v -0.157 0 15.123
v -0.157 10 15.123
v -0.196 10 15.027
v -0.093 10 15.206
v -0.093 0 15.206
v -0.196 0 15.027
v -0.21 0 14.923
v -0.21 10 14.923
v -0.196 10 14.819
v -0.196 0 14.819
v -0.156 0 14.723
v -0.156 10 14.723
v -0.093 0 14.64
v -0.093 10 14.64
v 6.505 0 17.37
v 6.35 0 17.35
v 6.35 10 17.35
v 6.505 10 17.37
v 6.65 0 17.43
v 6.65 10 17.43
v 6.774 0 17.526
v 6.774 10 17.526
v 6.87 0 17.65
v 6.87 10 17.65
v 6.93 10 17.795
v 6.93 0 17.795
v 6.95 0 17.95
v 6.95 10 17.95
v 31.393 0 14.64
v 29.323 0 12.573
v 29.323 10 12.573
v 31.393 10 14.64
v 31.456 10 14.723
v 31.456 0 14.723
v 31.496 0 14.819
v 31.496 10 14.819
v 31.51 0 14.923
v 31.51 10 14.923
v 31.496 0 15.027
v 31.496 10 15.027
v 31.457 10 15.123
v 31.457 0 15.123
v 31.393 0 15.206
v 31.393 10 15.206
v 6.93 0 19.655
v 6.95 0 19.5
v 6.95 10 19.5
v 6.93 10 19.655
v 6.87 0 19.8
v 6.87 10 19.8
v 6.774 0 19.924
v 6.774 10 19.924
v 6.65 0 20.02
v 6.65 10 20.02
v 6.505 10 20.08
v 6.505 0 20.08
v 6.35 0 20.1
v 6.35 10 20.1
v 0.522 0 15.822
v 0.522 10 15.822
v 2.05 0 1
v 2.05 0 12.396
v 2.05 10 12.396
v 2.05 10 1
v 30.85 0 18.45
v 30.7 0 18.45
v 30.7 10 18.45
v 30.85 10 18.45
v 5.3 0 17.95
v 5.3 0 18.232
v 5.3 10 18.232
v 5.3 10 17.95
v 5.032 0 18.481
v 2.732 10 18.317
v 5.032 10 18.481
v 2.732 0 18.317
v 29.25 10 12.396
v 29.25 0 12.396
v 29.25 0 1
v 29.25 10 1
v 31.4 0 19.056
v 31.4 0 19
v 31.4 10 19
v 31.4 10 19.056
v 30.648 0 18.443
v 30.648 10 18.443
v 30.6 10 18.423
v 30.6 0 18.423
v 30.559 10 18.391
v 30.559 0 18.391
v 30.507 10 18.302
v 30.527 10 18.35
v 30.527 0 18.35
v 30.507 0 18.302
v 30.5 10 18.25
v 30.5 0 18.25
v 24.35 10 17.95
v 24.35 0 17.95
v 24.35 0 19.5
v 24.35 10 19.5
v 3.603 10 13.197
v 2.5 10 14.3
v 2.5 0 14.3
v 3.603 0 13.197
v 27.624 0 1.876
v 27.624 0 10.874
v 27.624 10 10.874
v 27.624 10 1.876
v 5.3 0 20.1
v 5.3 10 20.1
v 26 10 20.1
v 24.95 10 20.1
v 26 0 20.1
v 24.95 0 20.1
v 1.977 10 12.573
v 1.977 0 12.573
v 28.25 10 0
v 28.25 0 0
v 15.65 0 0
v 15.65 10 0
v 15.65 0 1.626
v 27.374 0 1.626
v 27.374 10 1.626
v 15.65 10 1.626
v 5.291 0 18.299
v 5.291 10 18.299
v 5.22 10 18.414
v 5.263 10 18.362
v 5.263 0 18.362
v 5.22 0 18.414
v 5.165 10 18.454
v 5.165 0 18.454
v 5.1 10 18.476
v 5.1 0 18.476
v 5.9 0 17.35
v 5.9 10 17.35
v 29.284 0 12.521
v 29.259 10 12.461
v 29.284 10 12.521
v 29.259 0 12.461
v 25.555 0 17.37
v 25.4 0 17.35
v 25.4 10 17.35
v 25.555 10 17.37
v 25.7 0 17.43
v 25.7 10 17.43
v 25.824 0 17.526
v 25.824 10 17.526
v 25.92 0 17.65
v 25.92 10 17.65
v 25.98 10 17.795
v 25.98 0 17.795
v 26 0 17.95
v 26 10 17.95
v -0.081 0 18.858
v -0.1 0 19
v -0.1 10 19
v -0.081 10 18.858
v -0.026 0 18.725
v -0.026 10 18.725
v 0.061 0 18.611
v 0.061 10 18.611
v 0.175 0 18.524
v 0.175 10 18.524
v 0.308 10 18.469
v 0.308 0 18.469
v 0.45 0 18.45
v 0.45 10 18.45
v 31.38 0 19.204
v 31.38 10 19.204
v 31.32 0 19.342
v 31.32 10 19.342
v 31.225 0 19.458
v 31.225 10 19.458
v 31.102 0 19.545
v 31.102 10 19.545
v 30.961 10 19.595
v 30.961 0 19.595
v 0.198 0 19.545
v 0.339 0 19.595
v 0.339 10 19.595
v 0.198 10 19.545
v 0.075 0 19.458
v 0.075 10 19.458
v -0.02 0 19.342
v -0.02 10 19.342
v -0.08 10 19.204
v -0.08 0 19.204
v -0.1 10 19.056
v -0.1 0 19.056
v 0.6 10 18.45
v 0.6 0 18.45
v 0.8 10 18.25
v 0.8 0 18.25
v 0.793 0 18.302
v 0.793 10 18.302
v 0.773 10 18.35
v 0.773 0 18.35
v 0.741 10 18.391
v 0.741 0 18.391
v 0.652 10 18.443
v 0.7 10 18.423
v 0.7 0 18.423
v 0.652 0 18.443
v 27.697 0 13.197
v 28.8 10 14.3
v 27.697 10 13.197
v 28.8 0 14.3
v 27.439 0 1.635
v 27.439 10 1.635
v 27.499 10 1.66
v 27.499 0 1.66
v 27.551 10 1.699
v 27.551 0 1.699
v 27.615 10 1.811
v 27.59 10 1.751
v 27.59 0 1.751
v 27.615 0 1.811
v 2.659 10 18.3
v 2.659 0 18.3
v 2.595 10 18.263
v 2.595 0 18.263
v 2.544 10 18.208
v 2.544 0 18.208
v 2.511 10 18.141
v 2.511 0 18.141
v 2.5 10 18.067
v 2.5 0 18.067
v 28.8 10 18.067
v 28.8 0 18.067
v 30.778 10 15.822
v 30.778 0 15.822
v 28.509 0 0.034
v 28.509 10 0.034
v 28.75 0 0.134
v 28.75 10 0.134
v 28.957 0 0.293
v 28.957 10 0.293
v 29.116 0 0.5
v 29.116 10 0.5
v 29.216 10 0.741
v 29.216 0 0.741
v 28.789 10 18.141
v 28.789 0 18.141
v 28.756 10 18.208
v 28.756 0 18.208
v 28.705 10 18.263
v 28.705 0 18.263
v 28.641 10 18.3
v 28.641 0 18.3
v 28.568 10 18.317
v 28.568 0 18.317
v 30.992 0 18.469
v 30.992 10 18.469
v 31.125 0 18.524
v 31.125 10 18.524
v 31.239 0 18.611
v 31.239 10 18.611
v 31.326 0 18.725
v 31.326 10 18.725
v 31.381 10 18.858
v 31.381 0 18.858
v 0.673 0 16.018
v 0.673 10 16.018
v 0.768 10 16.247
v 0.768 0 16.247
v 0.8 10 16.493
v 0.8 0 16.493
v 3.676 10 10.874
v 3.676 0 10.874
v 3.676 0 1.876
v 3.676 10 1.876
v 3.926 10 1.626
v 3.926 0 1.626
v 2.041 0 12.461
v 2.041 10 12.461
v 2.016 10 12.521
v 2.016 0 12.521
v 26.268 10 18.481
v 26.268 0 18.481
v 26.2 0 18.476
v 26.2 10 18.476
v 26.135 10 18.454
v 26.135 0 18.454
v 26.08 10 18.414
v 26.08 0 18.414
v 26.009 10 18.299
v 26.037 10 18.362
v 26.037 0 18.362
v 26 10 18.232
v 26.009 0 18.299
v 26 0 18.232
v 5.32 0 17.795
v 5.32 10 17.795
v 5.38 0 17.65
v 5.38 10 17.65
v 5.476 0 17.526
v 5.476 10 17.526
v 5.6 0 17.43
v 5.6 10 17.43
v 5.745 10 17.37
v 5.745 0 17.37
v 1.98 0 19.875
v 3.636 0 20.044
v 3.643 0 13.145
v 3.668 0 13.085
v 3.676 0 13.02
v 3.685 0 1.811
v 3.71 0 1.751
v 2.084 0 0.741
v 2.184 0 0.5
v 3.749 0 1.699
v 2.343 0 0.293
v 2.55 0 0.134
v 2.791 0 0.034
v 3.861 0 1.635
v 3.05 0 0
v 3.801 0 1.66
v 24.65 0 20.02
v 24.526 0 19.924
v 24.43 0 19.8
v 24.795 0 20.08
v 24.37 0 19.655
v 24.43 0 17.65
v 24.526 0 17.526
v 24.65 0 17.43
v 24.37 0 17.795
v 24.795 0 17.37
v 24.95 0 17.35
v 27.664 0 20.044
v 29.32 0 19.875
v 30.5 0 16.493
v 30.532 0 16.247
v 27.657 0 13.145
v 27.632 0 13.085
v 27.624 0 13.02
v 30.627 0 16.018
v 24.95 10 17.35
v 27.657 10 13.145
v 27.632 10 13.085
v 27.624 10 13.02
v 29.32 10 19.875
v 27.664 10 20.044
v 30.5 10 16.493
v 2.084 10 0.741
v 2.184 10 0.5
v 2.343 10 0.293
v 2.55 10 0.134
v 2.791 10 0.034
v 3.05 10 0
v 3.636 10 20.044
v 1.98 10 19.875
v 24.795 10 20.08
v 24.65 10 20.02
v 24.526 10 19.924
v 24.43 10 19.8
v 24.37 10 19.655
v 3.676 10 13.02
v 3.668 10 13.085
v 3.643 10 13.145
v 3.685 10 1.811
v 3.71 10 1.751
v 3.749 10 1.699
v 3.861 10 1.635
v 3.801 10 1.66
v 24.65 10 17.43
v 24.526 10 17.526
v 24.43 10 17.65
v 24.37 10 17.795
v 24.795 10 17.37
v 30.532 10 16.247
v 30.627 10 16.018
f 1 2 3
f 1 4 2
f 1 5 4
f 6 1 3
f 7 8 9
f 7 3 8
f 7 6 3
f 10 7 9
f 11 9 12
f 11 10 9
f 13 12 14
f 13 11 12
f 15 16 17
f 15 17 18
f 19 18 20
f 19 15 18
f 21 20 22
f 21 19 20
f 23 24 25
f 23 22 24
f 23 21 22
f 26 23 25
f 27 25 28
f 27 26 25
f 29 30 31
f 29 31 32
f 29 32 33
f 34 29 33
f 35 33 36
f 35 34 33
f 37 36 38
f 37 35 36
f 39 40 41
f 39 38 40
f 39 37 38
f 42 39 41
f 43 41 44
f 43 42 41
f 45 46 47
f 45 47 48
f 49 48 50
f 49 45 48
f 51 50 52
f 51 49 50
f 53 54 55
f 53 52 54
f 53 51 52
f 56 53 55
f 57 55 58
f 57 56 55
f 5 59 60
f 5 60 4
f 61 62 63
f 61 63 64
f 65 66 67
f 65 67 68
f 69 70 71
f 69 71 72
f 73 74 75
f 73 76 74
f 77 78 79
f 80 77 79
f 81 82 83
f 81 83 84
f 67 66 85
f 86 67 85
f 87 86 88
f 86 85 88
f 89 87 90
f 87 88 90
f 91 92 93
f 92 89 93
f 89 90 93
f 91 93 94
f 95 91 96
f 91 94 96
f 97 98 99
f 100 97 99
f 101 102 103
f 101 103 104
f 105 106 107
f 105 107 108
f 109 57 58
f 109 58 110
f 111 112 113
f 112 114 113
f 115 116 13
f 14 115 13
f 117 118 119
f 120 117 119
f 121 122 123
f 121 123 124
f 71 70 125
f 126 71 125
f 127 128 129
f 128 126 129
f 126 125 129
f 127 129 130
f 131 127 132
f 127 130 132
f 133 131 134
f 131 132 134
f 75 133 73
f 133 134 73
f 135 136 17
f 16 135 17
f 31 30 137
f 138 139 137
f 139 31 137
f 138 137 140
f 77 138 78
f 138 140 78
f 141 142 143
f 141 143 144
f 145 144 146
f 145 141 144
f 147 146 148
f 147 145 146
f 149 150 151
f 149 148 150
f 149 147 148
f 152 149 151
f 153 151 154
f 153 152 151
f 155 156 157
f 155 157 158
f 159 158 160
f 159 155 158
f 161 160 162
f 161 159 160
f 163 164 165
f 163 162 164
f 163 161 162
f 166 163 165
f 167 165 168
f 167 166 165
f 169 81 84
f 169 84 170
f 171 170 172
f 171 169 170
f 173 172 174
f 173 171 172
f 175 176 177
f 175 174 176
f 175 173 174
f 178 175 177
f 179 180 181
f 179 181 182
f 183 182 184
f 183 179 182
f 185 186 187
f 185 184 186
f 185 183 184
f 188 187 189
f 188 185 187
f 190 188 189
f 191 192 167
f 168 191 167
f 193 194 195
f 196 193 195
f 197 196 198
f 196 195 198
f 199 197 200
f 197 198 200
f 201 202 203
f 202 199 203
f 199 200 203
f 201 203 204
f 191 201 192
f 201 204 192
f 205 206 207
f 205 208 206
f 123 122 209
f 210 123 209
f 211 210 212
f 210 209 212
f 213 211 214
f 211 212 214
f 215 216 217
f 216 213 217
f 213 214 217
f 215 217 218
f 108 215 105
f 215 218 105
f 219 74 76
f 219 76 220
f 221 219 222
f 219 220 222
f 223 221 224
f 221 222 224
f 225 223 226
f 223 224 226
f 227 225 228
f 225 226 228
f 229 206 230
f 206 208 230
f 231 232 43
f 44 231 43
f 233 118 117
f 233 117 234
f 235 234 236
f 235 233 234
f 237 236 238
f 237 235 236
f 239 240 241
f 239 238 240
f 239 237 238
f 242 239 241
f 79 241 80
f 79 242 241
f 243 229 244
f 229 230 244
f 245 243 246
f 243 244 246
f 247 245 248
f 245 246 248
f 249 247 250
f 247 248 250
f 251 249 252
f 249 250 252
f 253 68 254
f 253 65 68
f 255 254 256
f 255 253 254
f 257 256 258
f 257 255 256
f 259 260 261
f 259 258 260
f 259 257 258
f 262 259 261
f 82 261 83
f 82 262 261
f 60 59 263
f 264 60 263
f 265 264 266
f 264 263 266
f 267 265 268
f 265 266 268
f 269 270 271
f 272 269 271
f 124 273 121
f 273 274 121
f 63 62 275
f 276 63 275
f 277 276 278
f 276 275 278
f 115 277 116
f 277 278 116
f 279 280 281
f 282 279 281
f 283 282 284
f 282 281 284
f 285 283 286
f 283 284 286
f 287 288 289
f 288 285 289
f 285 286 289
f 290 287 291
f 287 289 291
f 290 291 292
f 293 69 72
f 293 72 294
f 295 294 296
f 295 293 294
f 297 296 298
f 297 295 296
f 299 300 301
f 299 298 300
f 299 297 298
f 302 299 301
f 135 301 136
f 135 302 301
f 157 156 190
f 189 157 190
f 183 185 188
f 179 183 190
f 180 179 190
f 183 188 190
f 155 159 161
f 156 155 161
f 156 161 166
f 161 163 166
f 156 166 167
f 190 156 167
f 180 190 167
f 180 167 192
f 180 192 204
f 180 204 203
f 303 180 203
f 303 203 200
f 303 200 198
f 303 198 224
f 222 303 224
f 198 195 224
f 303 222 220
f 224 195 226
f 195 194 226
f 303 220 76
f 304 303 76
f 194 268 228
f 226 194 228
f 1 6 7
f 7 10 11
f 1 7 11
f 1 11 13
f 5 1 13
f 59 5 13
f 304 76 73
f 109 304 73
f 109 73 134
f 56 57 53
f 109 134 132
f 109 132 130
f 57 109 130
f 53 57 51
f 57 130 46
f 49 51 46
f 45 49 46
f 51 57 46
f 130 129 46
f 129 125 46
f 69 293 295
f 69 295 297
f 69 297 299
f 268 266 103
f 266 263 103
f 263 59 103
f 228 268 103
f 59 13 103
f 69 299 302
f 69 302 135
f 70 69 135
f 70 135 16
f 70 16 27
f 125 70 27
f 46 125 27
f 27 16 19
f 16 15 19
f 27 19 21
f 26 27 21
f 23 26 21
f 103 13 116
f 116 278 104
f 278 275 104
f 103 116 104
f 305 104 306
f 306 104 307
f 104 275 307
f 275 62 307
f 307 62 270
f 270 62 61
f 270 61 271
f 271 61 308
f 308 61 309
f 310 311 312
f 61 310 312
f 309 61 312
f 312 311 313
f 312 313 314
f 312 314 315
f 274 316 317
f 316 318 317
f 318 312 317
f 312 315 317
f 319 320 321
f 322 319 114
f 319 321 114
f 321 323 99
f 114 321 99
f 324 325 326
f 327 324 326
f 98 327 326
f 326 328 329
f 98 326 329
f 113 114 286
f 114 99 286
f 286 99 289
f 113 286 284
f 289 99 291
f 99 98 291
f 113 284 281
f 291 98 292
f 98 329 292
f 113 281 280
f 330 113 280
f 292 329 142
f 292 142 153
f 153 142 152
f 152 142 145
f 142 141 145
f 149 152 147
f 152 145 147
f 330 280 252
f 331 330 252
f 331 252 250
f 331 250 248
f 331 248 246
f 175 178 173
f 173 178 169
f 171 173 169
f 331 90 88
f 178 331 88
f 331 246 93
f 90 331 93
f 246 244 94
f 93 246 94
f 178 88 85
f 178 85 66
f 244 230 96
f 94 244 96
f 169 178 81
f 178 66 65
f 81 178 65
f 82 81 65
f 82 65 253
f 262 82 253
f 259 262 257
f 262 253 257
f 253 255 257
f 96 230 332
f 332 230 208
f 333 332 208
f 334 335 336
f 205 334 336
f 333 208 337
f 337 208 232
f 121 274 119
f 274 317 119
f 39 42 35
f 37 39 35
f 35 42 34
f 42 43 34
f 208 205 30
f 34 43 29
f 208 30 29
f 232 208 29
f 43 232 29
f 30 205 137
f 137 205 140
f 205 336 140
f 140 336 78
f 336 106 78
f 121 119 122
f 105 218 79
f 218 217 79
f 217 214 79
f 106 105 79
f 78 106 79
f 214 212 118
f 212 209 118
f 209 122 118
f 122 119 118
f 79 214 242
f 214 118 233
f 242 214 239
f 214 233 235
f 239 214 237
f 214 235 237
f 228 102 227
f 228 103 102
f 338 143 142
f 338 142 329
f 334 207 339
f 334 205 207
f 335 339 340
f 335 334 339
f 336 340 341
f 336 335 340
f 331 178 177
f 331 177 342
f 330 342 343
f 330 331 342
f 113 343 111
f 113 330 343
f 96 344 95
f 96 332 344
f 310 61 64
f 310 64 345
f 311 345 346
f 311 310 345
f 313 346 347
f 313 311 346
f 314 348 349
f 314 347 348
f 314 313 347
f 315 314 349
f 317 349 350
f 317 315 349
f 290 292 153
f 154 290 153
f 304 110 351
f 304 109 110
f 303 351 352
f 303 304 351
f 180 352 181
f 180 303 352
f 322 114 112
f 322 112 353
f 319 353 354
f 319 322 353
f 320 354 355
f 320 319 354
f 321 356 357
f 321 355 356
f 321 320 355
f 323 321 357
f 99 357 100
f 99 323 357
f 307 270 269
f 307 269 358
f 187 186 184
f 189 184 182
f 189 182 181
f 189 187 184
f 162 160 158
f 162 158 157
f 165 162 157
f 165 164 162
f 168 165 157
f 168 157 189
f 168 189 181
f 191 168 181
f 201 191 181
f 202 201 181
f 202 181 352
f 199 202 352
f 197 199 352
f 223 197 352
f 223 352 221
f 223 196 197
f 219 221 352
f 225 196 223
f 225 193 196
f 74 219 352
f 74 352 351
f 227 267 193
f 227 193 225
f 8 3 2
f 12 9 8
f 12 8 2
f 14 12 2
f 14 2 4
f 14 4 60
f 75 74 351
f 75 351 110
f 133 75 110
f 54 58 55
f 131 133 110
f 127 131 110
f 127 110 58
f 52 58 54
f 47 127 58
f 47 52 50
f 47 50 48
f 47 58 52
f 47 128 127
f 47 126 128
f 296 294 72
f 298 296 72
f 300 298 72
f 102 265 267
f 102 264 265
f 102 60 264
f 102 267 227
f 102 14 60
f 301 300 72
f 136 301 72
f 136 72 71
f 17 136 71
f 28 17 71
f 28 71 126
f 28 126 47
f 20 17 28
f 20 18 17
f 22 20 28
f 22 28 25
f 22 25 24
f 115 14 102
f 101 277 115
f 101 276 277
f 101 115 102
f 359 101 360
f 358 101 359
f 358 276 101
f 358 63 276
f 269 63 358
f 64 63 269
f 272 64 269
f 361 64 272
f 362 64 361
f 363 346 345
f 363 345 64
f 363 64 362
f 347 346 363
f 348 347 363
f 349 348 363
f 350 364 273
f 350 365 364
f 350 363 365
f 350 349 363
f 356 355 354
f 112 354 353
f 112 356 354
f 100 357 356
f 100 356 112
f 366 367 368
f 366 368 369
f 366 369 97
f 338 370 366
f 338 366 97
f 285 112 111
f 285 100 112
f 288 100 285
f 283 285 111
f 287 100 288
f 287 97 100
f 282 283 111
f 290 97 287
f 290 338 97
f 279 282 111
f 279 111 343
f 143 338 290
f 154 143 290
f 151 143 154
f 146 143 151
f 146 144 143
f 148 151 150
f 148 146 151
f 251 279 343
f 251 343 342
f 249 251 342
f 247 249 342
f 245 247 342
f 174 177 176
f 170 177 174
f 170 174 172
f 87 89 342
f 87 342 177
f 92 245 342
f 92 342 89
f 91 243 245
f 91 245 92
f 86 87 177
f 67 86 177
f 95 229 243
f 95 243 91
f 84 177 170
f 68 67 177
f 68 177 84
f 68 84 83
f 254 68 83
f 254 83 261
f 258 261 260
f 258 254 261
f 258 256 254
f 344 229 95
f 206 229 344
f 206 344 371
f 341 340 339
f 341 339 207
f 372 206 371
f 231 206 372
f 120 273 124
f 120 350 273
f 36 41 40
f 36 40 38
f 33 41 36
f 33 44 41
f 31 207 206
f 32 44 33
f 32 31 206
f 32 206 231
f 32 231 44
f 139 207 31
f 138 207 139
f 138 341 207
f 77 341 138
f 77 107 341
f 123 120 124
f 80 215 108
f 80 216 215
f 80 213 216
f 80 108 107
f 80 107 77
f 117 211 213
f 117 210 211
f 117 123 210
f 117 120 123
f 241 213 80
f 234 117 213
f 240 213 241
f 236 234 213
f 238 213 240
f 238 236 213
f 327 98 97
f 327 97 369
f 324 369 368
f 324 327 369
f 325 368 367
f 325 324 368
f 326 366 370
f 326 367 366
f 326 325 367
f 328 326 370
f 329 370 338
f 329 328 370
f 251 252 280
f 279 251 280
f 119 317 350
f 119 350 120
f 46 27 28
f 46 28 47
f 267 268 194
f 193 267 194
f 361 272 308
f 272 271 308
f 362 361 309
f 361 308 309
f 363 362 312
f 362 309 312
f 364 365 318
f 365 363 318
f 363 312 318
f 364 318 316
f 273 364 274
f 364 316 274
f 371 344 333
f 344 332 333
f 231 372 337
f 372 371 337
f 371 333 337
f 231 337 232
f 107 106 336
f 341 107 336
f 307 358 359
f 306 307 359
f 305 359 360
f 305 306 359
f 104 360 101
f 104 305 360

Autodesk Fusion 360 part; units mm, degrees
sketch "Boceto1" plane through (0, 0, 0) normal (0, 1, 0) x (1, 0, 0)
  line L0 (2.05, 0) -> (0, 0) construction
  line L1 (3.05, 0) -> (15.65, 0)
  line L2 (2.05, -12.3964) -> (2.05, -1)
  arc A0 (3.05, 0) -> (2.05, -1) centre (3.05, -1) ccw
  line L3 (3.6762, -10.8738) -> (3.6762, -1.8762)
  line L4 (3.9262, -1.6262) -> (15.65, -1.6262)
  arc A1 (3.9262, -1.6262) -> (3.6762, -1.8762) centre (3.9262, -1.8762) ccw
  line L5 (1.9767, -12.5732) -> (-0.0927, -14.6402)
  line L6 (0.5221, -15.8217) -> (-0.093, -15.2059)
  arc A2 (-0.0927, -14.6402) -> (-0.093, -15.2059) centre (0.19, -14.9232) ccw
  line L7 (0.8, -16.4931) -> (0.8, -18.25)
  line L8 (0.6, -18.45) -> (0.45, -18.45)
  arc A3 (0.8, -16.4931) -> (0.5221, -15.8217) centre (-0.15, -16.4931) ccw
  arc A4 (0.6, -18.45) -> (0.8, -18.25) centre (0.6, -18.25) ccw
  line L9 (3.6762, -10.8738) -> (3.6762, -13.0203)
  line L10 (2.5, -14.3) -> (3.6029, -13.1971)
  line L11 (2.5, -14.3) -> (2.5, -18.0672)
  line L12 (2.7322, -18.3166) -> (5.0322, -18.4809)
  line L13 (5.3, -18.2315) -> (5.3, -17.95)
  line L14 (5.9, -17.35) -> (6.35, -17.35)
  line L15 (6.95, -17.95) -> (6.95, -19.5)
  line L16 (6.35, -20.1) -> (5.3, -20.1)
  line L17 (-0.1, -19) -> (-0.1, -19.0559)
  arc A5 (0.3391, -19.5946) -> (5.3, -20.1) centre (5.3, 4.5) ccw
  arc A6 (-0.1, -19.0559) -> (0.3391, -19.5946) centre (0.45, -19.0559) ccw
  arc A7 (0.45, -18.45) -> (-0.1, -19) centre (0.45, -19) ccw
  arc A8 (6.35, -20.1) -> (6.95, -19.5) centre (6.35, -19.5) ccw
  arc A9 (6.95, -17.95) -> (6.35, -17.35) centre (6.35, -17.95) ccw
  arc A10 (5.9, -17.35) -> (5.3, -17.95) centre (5.9, -17.95) ccw
  arc A11 (5.0322, -18.4809) -> (5.3, -18.2315) centre (5.05, -18.2315) ccw
  arc A12 (2.5, -18.0672) -> (2.7322, -18.3166) centre (2.75, -18.0672) ccw
  arc A13 (3.6029, -13.1971) -> (3.6762, -13.0203) centre (3.4262, -13.0203) ccw
  arc A14 (1.9767, -12.5732) -> (2.05, -12.3964) centre (1.8, -12.3964) ccw
  line L18 (15.65, 0) -> (15.65, -24.4844) construction
  line L19 (28.8, -14.3) -> (27.6971, -13.1971)
  line L20 (27.6238, -10.8738) -> (27.6238, -13.0203)
  arc A15 (24.35, -19.5) -> (24.95, -20.1) centre (24.95, -19.5) ccw
  line L21 (30.7, -18.45) -> (30.85, -18.45)
  line L22 (29.25, -12.3964) -> (29.25, -1)
  line L23 (26, -18.2315) -> (26, -17.95)
  line L24 (28.8, -14.3) -> (28.8, -18.0672)
  line L25 (30.7779, -15.8217) -> (31.393, -15.2059)
  arc A16 (30.5, -18.25) -> (30.7, -18.45) centre (30.7, -18.25) ccw
  line L26 (31.4, -19) -> (31.4, -19.0559)
  arc A17 (31.4, -19) -> (30.85, -18.45) centre (30.85, -19) ccw
  arc A18 (29.25, -1) -> (28.25, 0) centre (28.25, -1) ccw
  arc A19 (31.393, -15.2059) -> (31.3927, -14.6402) centre (31.11, -14.9232) ccw
  line L27 (25.4, -17.35) -> (24.95, -17.35)
  line L28 (29.3233, -12.5732) -> (31.3927, -14.6402)
  arc A20 (24.95, -17.35) -> (24.35, -17.95) centre (24.95, -17.95) ccw
  arc A21 (29.25, -12.3964) -> (29.3233, -12.5732) centre (29.5, -12.3964) ccw
  arc A22 (30.9609, -19.5946) -> (31.4, -19.0559) centre (30.85, -19.0559) ccw
  arc A23 (26, -18.2315) -> (26.2678, -18.4809) centre (26.25, -18.2315) ccw
  line L29 (29.25, 0) -> (31.3, 0) construction
  arc A24 (26, -20.1) -> (30.9609, -19.5946) centre (26, 4.5) ccw
  line L30 (24.35, -17.95) -> (24.35, -19.5)
  line L31 (24.95, -20.1) -> (26, -20.1)
  arc A25 (27.6238, -1.8762) -> (27.3738, -1.6262) centre (27.3738, -1.8762) ccw
  arc A26 (26, -17.95) -> (25.4, -17.35) centre (25.4, -17.95) ccw
  line L32 (30.5, -16.4931) -> (30.5, -18.25)
  arc A27 (28.5678, -18.3166) -> (28.8, -18.0672) centre (28.55, -18.0672) ccw
  line L33 (28.5678, -18.3166) -> (26.2678, -18.4809)
  line L34 (27.6238, -10.8738) -> (27.6238, -1.8762)
  arc A28 (30.7779, -15.8217) -> (30.5, -16.4931) centre (31.45, -16.4931) ccw
  arc A29 (27.6238, -13.0203) -> (27.6971, -13.1971) centre (27.8738, -13.0203) ccw
  line L35 (27.3738, -1.6262) -> (15.65, -1.6262)
  line L36 (28.25, 0) -> (15.65, 0)
  point P0 (31.3, 0)
  dimension "d1" = 1
  dimension "d3" = 0.25
  dimension "d4" = 0.4
  dimension "d5" = 0.95
  dimension "d6" = 0.2
  dimension "d7" = 0.55
  dimension "d8" = 0.6
  dimension "d9" = 0.25
extrude "Extruir1" add sketch "Boceto1" along normal blind 10
equation "L = 10 mm"
equation "d11 = L"
